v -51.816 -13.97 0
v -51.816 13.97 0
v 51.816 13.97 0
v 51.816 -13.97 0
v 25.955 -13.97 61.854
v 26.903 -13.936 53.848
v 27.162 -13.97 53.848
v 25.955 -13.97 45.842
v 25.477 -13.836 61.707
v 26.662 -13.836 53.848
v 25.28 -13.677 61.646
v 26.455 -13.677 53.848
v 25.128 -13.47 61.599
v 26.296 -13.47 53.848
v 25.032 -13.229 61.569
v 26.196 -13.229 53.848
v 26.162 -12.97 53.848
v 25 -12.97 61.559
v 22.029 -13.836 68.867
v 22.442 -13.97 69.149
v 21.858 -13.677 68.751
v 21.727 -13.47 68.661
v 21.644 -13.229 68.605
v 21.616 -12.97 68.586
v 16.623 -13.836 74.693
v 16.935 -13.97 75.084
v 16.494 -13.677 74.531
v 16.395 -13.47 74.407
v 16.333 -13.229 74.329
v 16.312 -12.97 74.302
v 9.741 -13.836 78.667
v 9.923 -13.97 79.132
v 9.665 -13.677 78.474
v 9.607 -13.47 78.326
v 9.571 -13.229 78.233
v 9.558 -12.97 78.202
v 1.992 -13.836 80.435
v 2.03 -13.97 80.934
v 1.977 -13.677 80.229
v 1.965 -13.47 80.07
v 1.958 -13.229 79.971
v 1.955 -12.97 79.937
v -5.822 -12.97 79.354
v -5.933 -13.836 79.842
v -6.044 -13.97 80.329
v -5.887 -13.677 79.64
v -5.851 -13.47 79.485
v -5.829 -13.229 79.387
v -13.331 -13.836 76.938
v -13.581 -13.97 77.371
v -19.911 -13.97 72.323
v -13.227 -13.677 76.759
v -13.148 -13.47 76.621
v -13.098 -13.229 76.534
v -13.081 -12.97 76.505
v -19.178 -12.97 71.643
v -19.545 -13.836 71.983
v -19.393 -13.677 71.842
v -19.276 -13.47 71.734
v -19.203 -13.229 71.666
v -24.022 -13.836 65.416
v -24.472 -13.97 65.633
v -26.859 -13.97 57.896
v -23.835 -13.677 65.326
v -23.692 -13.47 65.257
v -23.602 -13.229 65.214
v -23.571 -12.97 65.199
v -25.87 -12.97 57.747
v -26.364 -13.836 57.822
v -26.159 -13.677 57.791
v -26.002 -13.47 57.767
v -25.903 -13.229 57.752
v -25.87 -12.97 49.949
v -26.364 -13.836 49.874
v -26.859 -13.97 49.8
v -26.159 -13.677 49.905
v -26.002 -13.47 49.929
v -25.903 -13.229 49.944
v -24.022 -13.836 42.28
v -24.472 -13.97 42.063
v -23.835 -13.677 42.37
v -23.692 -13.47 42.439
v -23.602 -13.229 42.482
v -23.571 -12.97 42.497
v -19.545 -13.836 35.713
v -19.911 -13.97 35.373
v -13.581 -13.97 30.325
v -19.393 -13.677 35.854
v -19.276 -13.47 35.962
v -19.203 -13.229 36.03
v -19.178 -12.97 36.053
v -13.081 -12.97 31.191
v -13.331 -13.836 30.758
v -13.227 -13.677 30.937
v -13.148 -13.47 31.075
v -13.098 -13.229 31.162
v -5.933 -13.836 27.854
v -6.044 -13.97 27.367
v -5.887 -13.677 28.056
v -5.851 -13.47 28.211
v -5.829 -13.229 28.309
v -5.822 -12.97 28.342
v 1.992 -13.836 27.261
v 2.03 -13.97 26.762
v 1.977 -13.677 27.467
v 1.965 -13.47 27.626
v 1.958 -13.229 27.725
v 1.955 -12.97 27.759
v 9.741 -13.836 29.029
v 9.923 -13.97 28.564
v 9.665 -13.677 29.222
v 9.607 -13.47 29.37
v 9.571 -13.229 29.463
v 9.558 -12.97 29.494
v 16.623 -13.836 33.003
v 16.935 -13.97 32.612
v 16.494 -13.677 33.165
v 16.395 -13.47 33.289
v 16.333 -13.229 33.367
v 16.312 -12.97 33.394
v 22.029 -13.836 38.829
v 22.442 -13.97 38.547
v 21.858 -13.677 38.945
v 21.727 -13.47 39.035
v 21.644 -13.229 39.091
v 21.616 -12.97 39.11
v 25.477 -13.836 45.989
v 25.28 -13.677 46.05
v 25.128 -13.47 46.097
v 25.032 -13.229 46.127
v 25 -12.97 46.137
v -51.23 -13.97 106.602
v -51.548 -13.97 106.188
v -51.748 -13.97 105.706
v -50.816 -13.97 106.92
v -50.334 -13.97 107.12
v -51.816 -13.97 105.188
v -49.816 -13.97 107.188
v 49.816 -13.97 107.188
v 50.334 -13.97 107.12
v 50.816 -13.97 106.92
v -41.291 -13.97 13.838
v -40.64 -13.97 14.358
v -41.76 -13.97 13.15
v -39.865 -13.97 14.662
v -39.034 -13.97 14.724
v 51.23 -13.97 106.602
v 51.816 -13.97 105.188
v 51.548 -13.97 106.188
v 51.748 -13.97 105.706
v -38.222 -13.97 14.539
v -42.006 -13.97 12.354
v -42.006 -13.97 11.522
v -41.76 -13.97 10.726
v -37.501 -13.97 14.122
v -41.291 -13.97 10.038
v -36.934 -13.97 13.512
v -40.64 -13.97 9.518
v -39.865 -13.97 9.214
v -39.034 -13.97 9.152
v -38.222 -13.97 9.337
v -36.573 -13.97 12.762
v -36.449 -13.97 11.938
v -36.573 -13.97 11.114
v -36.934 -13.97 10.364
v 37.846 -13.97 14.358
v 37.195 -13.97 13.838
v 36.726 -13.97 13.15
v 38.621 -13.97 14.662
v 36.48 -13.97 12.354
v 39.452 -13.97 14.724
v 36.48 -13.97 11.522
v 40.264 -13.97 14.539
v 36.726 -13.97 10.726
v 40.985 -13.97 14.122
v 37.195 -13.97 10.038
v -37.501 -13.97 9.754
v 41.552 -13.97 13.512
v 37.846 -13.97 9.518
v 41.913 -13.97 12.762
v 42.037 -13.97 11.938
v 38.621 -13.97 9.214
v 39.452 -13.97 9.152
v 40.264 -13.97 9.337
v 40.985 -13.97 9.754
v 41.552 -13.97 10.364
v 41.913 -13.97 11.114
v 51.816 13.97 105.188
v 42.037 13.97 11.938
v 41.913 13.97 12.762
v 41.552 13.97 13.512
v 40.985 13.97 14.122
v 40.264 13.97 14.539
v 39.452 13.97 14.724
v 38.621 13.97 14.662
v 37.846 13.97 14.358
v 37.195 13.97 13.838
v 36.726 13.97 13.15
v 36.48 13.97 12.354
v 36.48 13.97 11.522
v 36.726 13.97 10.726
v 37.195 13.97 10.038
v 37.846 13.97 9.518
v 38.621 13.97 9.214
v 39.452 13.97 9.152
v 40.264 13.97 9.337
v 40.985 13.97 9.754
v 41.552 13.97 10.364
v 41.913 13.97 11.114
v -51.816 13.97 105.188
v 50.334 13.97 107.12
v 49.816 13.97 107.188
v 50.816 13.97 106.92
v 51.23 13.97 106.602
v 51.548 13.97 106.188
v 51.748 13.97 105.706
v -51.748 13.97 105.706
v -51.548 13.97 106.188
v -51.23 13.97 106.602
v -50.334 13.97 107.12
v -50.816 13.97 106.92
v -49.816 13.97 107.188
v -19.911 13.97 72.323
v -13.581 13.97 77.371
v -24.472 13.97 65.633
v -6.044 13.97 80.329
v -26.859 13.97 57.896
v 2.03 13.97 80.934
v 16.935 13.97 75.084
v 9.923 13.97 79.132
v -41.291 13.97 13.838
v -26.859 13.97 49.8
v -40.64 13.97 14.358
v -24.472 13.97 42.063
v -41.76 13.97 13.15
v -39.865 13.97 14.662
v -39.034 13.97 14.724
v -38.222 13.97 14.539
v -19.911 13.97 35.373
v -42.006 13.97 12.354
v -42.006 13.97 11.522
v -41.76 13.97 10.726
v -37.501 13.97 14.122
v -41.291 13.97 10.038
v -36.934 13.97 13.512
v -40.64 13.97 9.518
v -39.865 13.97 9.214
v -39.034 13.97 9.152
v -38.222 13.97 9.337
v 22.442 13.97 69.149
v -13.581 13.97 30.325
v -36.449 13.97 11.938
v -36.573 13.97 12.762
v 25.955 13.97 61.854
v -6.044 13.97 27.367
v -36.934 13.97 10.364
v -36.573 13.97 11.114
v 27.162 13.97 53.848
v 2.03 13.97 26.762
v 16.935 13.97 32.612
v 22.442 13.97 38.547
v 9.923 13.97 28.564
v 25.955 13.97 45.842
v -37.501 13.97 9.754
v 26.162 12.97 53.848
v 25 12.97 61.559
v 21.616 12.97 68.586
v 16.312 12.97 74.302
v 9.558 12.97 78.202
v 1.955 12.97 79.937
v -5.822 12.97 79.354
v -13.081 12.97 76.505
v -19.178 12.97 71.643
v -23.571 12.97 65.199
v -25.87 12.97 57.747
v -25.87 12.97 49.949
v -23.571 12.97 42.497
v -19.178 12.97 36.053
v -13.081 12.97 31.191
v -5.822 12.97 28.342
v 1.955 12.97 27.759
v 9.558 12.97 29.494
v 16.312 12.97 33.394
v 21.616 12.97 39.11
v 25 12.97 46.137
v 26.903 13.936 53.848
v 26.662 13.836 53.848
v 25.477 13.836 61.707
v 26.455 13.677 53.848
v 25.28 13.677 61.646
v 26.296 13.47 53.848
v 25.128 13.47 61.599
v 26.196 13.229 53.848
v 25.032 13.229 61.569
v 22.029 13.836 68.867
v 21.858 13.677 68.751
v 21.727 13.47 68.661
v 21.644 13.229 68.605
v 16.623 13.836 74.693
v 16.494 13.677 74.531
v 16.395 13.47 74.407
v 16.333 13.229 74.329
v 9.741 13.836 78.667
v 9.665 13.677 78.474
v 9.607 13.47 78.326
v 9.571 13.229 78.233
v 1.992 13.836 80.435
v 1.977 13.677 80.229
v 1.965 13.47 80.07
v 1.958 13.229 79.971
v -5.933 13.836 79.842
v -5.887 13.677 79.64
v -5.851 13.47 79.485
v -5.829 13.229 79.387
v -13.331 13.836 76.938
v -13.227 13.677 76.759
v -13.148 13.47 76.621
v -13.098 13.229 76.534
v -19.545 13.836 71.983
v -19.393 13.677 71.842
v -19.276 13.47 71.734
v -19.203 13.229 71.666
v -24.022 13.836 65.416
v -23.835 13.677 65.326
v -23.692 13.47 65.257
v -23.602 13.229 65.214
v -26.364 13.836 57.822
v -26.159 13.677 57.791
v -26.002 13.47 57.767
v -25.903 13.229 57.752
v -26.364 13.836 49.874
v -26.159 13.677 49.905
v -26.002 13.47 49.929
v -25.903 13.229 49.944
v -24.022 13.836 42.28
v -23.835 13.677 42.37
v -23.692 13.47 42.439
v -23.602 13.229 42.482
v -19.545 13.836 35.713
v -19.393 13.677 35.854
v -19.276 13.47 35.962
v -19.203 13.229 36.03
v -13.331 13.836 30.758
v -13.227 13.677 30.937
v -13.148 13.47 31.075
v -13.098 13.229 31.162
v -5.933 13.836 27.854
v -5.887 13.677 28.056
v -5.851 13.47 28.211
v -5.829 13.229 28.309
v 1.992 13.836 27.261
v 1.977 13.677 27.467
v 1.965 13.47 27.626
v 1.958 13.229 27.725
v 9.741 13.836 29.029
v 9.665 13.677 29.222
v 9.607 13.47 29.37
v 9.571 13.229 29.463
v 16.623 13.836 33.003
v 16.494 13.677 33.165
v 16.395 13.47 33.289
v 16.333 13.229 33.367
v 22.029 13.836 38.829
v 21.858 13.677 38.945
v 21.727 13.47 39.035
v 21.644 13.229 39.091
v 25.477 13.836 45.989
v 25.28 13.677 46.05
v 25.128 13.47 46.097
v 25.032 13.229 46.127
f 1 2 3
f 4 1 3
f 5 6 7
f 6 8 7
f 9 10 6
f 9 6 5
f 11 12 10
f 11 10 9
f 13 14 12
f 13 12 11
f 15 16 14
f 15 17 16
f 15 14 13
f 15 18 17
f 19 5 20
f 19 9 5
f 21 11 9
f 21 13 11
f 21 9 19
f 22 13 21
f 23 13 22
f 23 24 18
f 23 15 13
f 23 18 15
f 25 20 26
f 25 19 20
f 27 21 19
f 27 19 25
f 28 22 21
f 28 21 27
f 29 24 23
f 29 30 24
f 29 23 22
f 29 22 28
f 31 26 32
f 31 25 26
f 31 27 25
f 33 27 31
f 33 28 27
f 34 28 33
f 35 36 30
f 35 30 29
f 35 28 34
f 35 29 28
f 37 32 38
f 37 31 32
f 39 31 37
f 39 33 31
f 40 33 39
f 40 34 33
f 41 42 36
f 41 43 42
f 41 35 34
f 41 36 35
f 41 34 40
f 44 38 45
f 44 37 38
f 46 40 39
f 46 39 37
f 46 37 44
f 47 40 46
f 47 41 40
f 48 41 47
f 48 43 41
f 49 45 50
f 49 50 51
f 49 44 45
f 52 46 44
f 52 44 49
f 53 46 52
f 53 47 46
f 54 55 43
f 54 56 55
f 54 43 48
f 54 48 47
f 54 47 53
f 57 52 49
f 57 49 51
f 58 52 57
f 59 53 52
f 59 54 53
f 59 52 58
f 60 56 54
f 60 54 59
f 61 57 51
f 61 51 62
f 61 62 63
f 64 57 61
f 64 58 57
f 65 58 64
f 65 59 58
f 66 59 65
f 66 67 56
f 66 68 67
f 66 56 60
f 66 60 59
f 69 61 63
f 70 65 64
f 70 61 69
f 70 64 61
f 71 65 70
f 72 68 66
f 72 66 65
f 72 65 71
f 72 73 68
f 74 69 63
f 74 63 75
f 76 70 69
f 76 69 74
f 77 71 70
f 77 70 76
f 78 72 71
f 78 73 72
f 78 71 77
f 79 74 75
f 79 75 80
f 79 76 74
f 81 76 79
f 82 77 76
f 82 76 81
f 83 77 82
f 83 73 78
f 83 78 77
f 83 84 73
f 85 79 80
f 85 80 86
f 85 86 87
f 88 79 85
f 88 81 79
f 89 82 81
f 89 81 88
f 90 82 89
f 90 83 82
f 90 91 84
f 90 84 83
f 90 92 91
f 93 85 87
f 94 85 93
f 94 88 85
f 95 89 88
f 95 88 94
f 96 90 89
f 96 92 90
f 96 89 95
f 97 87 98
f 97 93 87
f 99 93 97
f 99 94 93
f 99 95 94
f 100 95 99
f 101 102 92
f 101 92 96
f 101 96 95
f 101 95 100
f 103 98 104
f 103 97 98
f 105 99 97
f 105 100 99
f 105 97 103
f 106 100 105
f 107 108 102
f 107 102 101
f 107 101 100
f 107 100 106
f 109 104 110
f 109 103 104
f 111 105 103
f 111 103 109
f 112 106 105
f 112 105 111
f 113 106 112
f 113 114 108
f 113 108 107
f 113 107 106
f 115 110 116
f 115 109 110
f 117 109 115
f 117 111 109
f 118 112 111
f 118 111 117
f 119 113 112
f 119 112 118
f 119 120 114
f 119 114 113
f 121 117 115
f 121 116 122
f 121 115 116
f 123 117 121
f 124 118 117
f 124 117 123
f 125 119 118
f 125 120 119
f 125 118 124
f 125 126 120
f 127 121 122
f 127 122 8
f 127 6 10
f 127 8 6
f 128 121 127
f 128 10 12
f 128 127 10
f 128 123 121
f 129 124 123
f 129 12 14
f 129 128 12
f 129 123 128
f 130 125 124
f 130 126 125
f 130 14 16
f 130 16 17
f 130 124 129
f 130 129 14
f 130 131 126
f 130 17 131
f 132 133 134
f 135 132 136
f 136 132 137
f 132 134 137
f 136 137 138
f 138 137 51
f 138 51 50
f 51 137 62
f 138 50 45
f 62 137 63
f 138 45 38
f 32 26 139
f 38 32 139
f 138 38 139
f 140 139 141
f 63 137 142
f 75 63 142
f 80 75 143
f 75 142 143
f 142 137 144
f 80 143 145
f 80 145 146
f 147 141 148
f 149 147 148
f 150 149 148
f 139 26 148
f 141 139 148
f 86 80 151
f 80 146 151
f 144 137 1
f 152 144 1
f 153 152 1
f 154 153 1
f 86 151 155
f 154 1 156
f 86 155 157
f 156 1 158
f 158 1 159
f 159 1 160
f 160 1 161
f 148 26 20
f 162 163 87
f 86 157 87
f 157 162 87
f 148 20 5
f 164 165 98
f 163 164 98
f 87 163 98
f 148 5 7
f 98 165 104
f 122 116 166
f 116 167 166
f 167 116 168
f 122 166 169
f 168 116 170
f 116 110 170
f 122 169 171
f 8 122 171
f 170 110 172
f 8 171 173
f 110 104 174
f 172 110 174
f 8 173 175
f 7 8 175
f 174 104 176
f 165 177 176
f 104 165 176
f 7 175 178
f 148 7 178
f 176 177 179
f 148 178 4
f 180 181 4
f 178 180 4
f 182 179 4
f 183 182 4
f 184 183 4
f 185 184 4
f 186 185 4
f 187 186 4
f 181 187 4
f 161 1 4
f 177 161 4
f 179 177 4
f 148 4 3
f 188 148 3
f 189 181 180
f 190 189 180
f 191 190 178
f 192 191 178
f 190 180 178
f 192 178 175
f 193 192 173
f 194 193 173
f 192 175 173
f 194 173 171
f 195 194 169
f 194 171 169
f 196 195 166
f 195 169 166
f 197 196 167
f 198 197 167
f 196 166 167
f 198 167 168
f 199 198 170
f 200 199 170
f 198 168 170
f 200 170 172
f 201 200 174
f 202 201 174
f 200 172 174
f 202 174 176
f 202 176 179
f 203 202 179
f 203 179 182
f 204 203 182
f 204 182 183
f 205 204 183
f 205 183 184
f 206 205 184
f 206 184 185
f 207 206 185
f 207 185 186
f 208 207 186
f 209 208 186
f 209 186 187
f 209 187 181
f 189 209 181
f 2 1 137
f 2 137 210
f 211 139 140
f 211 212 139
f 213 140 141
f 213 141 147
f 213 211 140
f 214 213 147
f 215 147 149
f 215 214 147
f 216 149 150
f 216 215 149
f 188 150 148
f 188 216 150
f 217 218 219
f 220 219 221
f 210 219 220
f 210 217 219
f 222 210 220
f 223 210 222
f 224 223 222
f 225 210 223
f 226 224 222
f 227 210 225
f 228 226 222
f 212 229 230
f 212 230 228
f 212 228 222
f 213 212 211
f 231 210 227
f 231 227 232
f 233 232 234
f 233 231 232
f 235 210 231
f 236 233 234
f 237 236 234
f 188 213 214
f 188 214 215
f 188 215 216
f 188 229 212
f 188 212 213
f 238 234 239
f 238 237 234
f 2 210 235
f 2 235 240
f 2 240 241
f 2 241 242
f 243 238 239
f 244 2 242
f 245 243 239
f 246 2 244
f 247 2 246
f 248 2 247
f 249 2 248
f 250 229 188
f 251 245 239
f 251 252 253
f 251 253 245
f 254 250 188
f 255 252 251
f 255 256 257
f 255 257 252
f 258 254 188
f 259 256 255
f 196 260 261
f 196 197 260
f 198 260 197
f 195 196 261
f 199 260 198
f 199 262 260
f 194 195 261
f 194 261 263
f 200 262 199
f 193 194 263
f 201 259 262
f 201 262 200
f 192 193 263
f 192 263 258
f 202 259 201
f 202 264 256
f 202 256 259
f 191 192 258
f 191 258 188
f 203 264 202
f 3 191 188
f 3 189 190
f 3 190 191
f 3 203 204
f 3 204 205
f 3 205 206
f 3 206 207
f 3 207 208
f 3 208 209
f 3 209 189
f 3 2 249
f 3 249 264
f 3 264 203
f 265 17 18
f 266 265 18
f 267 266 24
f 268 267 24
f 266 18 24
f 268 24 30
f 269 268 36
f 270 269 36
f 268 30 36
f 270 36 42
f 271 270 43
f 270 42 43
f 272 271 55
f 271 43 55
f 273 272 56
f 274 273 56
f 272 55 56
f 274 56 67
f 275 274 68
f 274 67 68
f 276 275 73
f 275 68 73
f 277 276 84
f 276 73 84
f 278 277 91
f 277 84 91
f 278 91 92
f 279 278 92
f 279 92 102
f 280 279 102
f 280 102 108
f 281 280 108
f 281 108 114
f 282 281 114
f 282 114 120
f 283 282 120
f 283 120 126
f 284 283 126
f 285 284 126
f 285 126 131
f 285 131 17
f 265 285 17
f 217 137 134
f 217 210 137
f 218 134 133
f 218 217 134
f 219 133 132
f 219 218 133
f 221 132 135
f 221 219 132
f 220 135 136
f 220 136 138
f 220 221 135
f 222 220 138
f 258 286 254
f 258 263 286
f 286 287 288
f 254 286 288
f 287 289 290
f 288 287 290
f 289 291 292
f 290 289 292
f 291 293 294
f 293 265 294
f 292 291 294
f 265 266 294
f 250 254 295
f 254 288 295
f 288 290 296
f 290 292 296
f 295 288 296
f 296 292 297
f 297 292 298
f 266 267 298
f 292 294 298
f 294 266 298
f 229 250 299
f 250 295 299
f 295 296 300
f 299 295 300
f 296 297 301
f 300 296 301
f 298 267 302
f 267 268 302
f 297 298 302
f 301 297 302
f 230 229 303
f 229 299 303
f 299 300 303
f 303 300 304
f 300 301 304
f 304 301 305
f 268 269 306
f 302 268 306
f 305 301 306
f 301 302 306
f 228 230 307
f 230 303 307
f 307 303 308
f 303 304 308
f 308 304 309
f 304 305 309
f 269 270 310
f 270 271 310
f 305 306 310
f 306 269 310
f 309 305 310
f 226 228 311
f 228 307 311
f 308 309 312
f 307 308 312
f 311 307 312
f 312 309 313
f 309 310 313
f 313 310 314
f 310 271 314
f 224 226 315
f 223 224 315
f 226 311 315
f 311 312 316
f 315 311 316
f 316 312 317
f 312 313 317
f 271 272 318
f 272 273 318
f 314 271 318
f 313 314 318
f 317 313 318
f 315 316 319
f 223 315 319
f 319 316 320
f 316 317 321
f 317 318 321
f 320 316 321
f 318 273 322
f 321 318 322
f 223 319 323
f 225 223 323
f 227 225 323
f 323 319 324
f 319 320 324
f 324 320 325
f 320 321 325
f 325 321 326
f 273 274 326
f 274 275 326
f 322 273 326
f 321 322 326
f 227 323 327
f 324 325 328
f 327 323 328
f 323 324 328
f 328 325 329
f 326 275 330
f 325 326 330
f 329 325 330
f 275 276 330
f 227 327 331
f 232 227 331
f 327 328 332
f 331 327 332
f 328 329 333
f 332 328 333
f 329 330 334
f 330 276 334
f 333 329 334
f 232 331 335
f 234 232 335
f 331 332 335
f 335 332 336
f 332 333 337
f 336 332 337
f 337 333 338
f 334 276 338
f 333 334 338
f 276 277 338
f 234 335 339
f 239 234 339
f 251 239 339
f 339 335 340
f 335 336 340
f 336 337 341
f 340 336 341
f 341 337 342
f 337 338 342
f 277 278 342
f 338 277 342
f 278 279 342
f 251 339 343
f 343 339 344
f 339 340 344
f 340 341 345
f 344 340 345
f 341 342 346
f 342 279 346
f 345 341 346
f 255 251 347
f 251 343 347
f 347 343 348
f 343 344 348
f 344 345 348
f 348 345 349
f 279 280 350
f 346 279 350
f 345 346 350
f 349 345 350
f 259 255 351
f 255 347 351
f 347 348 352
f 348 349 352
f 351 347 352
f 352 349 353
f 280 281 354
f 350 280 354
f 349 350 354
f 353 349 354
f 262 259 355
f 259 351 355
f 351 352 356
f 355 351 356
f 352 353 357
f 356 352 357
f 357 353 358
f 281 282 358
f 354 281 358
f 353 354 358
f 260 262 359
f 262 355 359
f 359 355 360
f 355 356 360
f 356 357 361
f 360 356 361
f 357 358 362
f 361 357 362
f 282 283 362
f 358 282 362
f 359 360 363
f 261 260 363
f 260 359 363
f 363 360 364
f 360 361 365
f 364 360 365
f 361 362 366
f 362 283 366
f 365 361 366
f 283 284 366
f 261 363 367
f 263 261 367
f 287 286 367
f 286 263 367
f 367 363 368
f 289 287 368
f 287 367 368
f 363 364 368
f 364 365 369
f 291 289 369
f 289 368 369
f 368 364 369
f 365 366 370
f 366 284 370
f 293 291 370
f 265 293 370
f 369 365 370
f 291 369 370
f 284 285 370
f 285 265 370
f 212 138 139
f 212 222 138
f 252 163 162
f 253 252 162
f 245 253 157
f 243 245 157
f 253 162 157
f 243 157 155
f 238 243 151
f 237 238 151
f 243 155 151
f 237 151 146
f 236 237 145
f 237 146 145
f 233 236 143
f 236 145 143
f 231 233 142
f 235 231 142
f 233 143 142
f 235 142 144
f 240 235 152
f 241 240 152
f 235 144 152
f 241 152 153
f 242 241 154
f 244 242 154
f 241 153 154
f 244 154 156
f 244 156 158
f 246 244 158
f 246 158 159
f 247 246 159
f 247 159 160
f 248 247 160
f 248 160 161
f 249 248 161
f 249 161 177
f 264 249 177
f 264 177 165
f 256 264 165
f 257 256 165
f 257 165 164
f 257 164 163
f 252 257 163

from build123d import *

# Parameters (mm, degrees)
F0_W     = 103.632
F0_H     = 27.94
F1_DEPTH = 107.188
F2_R     = 26.162
F3_DEPTH = 27.941
F4_R     = 2.794
F5_DEPTH = 27.941
F6_R     = 1
F7_R     = 2


with BuildPart() as f1:
    # F0 (on Top) → F1 (new body)
    with BuildSketch(Plane.XY):
        Rectangle(F0_W, F0_H)
    extrude(amount=F1_DEPTH)

    # F2 (on face) → F3 (cut, through all)
    with BuildSketch(Plane.XZ.offset(13.97)):
        with Locations((0, 53.848)):
            Circle(F2_R)
    extrude(amount=-F3_DEPTH, mode=Mode.SUBTRACT)

    # F4 (on face) → F5 (cut, through all)
    with BuildSketch(Plane.XZ.offset(13.97)):
        with Locations((-39.243, 11.938)):
            Circle(F4_R)
        with Locations((39.243, 11.938)):
            Circle(F4_R)
    extrude(amount=-F5_DEPTH, mode=Mode.SUBTRACT)

    # F6
    f6_edges = [f1.edges().sort_by_distance(p)[0] for p in [
        (-26.162, -13.97, 53.848),
        (26.162, 0, 53.848),
        (-26.162, 13.97, 53.848),
    ]]
    fillet(f6_edges, radius=F6_R)

    # F7
    f7_edges = [f1.edges().sort_by_distance(p)[0] for p in [
        (51.816, 0, 107.188),
        (-51.816, 0, 107.188),
    ]]
    fillet(f7_edges, radius=F7_R)


solid = f1.part
